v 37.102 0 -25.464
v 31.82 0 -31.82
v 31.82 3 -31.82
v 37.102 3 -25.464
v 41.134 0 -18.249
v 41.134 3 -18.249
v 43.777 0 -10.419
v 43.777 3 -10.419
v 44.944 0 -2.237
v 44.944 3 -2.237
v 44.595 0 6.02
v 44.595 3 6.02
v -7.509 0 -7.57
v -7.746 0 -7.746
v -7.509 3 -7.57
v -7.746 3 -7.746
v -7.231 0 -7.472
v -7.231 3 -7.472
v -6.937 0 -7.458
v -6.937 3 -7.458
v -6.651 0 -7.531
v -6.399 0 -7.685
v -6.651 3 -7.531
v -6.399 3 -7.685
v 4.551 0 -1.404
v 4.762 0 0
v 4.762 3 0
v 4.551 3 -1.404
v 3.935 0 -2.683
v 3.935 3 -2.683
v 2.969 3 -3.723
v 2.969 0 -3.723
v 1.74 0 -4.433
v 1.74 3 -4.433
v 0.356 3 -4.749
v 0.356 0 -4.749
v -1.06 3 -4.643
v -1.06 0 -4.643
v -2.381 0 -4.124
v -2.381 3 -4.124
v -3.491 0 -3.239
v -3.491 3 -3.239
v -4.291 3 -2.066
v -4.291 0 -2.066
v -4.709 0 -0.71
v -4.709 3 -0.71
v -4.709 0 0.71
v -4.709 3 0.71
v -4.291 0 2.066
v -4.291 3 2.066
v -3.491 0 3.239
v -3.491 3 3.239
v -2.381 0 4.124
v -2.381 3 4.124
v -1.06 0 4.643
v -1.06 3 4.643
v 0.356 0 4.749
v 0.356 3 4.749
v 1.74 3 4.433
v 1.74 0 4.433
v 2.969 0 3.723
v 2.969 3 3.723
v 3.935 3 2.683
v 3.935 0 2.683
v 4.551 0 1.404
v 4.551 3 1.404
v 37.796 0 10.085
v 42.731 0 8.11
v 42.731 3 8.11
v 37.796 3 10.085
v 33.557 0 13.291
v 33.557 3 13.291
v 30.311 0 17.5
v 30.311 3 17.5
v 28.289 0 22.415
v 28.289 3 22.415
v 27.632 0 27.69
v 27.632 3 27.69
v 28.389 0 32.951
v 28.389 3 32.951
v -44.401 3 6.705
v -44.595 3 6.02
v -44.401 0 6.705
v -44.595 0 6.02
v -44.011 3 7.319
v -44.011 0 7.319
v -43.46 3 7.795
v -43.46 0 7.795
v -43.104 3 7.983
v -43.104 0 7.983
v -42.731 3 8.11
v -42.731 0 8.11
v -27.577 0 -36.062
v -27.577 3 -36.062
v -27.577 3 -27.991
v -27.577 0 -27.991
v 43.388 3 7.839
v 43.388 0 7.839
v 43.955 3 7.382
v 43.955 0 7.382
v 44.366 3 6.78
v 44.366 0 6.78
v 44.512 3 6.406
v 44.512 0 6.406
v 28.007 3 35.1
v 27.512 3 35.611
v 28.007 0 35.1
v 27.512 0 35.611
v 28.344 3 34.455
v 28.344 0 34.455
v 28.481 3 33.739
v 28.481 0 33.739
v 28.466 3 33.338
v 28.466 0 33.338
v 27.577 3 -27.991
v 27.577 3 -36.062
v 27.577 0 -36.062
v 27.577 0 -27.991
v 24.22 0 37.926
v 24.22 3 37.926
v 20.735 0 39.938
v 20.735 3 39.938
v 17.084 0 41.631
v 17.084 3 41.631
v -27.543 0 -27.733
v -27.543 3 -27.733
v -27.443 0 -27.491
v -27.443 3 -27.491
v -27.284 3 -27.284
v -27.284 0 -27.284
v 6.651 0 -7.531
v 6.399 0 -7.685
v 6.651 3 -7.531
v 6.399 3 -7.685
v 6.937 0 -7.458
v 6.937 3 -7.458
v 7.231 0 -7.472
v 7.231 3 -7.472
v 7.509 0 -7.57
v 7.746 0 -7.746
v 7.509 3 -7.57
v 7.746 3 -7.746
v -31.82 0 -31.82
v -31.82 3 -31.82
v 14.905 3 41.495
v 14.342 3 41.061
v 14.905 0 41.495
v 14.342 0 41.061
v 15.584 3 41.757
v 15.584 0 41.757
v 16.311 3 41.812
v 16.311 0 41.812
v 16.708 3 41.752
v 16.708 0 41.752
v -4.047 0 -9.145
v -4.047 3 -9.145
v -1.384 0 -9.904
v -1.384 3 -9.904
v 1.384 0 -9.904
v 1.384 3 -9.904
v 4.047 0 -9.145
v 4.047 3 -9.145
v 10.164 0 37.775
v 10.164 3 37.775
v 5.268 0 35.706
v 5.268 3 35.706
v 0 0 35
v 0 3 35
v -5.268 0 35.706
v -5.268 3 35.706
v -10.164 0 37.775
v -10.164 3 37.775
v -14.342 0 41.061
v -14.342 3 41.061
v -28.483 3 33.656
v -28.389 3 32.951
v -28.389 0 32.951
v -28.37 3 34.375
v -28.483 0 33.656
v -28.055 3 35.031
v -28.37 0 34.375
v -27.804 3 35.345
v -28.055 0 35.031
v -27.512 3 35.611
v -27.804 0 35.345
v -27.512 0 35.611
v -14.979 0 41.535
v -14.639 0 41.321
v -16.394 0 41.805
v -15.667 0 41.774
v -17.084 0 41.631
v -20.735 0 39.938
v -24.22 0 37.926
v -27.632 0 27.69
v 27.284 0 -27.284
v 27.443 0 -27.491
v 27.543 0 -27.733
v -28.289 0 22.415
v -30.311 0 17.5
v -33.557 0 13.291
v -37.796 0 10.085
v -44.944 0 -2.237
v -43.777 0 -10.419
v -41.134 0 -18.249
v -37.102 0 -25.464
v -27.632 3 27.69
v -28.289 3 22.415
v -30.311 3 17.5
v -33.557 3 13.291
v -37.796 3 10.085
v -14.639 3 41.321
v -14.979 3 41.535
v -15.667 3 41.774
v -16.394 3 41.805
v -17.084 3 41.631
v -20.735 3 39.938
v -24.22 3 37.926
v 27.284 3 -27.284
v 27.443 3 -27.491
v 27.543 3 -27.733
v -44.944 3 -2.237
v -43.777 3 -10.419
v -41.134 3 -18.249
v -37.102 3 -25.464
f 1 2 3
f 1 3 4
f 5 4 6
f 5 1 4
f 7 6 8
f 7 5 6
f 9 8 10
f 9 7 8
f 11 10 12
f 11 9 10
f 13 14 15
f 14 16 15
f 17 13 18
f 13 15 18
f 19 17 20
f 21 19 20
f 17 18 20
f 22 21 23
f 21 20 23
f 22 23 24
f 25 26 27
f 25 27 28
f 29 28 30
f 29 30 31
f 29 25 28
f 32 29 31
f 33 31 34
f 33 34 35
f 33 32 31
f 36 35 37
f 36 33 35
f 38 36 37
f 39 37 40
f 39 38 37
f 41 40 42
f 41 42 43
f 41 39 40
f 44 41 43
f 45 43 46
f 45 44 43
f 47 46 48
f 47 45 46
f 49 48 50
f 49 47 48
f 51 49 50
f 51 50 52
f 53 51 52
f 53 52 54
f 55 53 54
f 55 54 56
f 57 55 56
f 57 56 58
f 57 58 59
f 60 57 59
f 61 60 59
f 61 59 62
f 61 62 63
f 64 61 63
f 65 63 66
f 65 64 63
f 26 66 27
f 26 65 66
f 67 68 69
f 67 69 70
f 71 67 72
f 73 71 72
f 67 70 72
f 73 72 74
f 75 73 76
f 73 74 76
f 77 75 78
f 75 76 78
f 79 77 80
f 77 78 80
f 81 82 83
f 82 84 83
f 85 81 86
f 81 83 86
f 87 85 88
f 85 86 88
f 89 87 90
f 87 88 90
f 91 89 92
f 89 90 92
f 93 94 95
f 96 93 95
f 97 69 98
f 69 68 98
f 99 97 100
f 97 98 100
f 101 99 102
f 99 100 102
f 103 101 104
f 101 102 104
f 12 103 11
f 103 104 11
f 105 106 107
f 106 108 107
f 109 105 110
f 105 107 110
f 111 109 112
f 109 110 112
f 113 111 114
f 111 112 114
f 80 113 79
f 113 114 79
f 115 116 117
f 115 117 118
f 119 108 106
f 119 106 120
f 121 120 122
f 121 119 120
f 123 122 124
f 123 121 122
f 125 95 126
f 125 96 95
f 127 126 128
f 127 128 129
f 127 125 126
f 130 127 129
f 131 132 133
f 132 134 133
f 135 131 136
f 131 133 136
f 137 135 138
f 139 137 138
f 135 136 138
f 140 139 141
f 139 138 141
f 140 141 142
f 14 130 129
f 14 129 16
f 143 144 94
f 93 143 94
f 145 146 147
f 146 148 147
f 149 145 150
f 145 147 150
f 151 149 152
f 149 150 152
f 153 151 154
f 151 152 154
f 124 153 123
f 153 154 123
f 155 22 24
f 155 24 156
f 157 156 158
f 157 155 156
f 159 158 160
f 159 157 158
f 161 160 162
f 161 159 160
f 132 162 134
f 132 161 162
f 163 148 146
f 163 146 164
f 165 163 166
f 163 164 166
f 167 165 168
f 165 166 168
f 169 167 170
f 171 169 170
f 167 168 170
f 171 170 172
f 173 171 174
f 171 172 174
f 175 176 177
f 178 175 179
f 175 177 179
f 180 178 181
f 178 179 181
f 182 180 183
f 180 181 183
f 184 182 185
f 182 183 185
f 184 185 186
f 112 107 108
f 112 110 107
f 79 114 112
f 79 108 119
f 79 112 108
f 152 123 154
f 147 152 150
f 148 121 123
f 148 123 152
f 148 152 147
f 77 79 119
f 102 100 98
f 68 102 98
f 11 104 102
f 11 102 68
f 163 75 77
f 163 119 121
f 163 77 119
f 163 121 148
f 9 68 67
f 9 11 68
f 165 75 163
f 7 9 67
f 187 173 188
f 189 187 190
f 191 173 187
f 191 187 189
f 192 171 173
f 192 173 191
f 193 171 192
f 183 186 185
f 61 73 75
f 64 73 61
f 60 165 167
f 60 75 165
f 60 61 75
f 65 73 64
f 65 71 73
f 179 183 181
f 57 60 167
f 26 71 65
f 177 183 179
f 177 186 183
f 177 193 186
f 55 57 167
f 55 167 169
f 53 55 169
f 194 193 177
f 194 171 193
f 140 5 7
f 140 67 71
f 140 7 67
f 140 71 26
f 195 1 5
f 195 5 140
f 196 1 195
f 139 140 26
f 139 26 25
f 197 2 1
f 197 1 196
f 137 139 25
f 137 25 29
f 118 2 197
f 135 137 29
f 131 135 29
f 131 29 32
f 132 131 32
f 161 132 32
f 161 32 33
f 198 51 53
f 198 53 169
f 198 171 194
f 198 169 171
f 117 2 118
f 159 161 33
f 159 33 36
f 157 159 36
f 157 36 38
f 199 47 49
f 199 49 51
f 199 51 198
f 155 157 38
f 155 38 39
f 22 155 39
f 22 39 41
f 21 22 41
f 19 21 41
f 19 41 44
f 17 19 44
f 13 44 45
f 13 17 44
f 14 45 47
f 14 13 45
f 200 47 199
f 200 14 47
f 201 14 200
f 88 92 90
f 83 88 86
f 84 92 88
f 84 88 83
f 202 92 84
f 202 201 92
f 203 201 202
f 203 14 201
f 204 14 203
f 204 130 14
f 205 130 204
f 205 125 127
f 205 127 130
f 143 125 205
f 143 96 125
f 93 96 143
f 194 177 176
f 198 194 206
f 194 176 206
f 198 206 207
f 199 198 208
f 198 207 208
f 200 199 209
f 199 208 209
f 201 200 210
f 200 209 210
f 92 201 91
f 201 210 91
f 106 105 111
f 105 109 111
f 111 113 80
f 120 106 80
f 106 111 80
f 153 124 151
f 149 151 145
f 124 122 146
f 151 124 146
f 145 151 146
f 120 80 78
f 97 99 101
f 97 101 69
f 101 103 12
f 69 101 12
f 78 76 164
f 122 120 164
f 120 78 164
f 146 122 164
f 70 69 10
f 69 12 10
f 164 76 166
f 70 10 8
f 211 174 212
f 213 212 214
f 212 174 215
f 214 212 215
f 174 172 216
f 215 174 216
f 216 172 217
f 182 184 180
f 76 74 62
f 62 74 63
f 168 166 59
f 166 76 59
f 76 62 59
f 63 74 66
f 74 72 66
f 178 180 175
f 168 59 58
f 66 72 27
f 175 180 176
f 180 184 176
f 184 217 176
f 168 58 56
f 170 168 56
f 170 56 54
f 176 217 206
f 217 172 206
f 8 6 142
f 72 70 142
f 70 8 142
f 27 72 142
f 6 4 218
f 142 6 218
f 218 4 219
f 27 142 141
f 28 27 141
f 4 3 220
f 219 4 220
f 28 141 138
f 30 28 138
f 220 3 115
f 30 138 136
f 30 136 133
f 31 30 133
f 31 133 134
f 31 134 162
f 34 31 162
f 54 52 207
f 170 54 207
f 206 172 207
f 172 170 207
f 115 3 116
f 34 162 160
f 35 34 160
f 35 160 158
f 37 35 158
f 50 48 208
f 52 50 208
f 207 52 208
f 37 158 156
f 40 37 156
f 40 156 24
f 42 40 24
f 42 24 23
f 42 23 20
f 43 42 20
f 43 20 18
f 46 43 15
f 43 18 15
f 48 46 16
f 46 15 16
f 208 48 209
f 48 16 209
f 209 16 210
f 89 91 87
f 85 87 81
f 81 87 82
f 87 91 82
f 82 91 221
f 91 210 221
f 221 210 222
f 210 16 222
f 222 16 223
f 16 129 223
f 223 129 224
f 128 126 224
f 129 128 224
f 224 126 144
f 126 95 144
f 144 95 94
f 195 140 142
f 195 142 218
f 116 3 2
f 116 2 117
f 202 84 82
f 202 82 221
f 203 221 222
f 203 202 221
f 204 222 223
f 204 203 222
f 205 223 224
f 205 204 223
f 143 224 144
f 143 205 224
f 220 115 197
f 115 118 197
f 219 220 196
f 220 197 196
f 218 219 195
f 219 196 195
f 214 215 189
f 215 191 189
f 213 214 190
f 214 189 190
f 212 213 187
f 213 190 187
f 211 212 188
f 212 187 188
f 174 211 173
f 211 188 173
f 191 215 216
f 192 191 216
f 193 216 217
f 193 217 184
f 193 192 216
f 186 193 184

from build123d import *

# Parameters (mm, degrees)
SKETCH1_R           = 4.7625
BOSS_EXTRUDE1_DEPTH = 3
BOSS_EXTRUDE2_DEPTH = 3
FILLET1_R           = 1
SKETCH4_R           = 20
CUT_EXTRUDE1_DEPTH  = 10
FILLET2_R           = 2.5


with BuildPart() as part:
    # Sketch1 → Boss-Extrude1 (new body)
    with BuildSketch(Plane(origin=(0, 0, 0), x_dir=(1, 0, 0), z_dir=(0, 1, 0))):
        with BuildLine():
            Line((-31.819805153, 31.819805153), (-7.071067812, 7.071067812))
            ThreePointArc((-7.071067812, 7.071067812), (0, 10), (7.071067812, 7.071067812))
            Line((7.071067812, 7.071067812), (31.819805153, 31.819805153))
            ThreePointArc((31.819805153, 31.819805153), (0, -45), (-31.819805153, 31.819805153))
        make_face()
        Circle(SKETCH1_R, mode=Mode.SUBTRACT)
    extrude(amount=BOSS_EXTRUDE1_DEPTH)

    # Sketch3 → Boss-Extrude2 (add)
    with BuildSketch(Plane(origin=(0, 3, 0), x_dir=(1, 0, 0), z_dir=(0, 1, 0))):
        Polygon((-31.819805153, 31.819805153), (-27.577164466, 36.062445841), (-27.577164466, 27.577164466), align=None)
        Polygon((27.577164466, 27.577164466), (31.819805153, 31.819805153), (27.577164466, 36.062445841), align=None)
    extrude(amount=-BOSS_EXTRUDE2_DEPTH)

    # Fillet1
    fillet1_edges = [part.edges().sort_by_distance(p)[0] for p in [
        (-27.577164466, 1.5, -27.577164466),
        (27.577164466, 1.5, -27.577164466),
        (7.071067812, 1.5, -7.071067812),
        (-7.071067812, 1.5, -7.071067812),
    ]]
    fillet(fillet1_edges, radius=FILLET1_R)

    # Sketch4 → Cut-Extrude1 (cut)
    with BuildSketch(Plane(origin=(0, 3, 0), x_dir=(1, 0, 0), z_dir=(0, 1, 0))):
        with Locations((-47.631397208, -27.5)):
            Circle(SKETCH4_R)
        with Locations((47.631397208, -27.5)):
            Circle(SKETCH4_R)
        with Locations((0, -55)):
            Circle(SKETCH4_R)
    extrude(amount=-CUT_EXTRUDE1_DEPTH, mode=Mode.SUBTRACT)

    # Fillet2
    fillet2_edges = [part.edges().sort_by_distance(p)[0] for p in [
        (15.427784317, 1.5, 42.272727273),
        (-15.427784317, 1.5, 42.272727273),
        (44.323147864, 1.5, 7.775510494),
        (28.895363547, 1.5, 34.497216779),
        (-28.895363547, 1.5, 34.497216779),
        (-44.323147864, 1.5, 7.775510494),
    ]]
    fillet(fillet2_edges, radius=FILLET2_R)


solid = part.part
